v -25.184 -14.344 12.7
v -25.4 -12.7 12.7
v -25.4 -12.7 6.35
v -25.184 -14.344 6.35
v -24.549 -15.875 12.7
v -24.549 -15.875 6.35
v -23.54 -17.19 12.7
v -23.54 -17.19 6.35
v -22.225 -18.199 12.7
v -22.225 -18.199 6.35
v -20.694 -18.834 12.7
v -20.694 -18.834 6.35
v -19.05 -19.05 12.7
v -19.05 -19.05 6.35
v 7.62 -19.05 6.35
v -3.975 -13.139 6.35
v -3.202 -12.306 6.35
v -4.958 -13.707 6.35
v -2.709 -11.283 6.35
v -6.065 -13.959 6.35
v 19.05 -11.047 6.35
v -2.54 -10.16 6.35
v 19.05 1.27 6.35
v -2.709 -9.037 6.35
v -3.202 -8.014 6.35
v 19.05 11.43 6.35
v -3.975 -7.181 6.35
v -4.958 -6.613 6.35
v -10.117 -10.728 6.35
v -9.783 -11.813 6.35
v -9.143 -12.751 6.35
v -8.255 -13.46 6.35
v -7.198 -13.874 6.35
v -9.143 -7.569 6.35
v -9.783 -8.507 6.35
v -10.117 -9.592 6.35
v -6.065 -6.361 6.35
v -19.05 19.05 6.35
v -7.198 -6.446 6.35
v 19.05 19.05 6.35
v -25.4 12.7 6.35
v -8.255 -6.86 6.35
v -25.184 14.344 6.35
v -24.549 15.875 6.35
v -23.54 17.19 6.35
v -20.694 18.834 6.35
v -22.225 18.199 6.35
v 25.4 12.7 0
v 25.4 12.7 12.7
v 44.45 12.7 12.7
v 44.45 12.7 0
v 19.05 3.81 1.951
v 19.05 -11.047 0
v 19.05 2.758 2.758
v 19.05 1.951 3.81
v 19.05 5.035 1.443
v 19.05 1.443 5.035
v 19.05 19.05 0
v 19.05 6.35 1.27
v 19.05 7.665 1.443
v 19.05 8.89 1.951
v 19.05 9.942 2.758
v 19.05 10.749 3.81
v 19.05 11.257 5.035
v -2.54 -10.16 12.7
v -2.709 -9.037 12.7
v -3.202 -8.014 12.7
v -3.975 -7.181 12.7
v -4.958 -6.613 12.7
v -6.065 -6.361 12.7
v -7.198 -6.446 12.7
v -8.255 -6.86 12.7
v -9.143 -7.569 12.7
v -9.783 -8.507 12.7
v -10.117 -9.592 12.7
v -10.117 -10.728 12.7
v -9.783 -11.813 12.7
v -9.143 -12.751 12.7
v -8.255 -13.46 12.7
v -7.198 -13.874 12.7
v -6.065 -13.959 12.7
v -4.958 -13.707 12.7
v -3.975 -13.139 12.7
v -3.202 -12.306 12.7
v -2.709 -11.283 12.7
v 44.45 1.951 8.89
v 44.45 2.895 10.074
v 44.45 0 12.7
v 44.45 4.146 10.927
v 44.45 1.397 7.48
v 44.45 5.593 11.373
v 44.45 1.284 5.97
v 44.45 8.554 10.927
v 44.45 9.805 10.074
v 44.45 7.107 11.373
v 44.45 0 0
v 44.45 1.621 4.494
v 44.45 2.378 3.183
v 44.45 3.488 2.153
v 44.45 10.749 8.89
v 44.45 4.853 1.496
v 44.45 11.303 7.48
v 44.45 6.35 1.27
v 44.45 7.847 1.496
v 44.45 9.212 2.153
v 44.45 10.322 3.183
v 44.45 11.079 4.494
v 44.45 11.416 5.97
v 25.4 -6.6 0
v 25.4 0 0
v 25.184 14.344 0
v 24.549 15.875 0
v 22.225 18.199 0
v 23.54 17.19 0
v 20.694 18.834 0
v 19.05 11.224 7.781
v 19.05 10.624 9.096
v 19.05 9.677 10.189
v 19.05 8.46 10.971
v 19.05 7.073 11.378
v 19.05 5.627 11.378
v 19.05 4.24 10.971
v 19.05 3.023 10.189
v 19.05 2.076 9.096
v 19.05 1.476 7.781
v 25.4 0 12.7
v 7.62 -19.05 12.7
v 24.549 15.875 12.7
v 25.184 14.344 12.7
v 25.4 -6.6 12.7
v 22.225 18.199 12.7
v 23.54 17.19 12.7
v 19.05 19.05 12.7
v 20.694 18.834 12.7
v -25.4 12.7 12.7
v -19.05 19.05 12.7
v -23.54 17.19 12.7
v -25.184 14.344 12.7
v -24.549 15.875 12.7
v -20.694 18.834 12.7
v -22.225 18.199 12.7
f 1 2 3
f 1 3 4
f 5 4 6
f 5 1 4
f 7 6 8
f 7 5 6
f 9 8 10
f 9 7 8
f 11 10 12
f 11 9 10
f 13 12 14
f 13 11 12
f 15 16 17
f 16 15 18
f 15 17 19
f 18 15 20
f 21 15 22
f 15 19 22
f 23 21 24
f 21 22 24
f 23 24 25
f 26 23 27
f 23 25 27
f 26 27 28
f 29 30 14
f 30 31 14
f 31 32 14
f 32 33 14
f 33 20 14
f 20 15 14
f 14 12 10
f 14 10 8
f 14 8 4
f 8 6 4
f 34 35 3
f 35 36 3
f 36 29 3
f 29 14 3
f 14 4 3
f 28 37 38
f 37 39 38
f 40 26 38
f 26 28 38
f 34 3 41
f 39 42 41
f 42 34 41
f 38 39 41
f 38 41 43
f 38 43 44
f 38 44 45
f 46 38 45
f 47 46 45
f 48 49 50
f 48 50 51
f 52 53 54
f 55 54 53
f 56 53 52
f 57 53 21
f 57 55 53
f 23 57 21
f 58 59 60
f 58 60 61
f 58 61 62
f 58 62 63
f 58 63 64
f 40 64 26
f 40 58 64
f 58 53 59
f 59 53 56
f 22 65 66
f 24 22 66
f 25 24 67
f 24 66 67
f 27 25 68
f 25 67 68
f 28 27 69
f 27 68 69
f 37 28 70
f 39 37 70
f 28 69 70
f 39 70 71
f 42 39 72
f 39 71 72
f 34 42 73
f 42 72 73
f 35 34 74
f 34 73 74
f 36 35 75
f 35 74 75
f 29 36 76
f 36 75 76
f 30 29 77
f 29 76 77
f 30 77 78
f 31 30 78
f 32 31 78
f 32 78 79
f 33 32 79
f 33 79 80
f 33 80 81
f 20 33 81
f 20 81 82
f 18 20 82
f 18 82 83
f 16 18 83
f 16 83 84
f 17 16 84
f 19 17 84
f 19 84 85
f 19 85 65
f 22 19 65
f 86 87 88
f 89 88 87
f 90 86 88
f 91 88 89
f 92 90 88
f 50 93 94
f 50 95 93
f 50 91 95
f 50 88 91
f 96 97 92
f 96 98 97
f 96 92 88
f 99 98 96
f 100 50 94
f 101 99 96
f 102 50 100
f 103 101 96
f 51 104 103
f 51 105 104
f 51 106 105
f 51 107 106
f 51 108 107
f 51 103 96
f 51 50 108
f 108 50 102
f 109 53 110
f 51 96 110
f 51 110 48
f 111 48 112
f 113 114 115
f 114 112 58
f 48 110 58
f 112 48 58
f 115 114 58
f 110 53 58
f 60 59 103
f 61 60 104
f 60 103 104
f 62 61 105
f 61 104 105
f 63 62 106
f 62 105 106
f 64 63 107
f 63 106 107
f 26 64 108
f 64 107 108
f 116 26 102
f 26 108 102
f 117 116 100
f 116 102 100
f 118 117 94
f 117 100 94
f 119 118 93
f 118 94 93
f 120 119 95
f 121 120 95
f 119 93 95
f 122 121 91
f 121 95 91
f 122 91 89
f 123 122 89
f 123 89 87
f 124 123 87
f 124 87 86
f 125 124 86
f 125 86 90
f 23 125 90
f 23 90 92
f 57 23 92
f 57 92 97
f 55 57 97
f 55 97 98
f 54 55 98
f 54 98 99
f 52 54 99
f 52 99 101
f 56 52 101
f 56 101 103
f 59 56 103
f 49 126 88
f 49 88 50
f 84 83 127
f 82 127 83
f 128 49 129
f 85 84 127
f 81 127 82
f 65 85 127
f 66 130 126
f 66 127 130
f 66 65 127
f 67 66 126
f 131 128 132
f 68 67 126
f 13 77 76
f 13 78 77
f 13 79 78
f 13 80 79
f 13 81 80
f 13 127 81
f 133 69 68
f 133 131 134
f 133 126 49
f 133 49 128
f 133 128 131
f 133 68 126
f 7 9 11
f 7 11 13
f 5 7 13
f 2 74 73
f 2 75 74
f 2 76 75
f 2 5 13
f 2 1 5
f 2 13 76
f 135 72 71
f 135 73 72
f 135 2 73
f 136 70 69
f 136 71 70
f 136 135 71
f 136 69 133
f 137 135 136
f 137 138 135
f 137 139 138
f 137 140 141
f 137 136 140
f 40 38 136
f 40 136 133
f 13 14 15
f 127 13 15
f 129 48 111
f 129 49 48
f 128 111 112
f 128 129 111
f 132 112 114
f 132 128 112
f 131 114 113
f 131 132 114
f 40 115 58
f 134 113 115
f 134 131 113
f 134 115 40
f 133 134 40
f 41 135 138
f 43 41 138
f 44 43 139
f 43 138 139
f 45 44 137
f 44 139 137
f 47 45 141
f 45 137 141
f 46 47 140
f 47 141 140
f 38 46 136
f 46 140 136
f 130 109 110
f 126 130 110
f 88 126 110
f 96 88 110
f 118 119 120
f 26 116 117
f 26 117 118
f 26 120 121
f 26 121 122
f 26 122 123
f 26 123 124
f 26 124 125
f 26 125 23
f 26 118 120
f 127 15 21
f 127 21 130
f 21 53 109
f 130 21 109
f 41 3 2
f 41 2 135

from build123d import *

# Parameters (mm, degrees)
SKETCH2_W           = 50.8
SKETCH2_H           = 38.1
BOSS_EXTRUDE1_DEPTH = 12.7
FILLET1_R           = 6.35
SKETCH3_R           = 3.81
CUT_EXTRUDE1_DEPTH  = 35.195796525
SKETCH7_W           = 12.7
SKETCH7_H           = 12.7
BOSS_EXTRUDE2_DEPTH = 19.05
SKETCH8_R           = 5.08
CUT_EXTRUDE2_DEPTH  = 25.4
SKETCH9_W           = 6.35
SKETCH9_H           = 38.1
CUT_EXTRUDE3_DEPTH  = 44.45
CUT_EXTRUDE4_REACH  = 52
SKETCH10_W          = 6.35
SKETCH10_H          = 6.35
CHAMFER6_SIZE       = 17.78
CHAMFER6_SIZE_2     = 12.449690029


with BuildPart() as part:
    # Sketch2 → Boss-Extrude1 (new body)
    with BuildSketch(Plane.XY):
        Rectangle(SKETCH2_W, SKETCH2_H)
    extrude(amount=BOSS_EXTRUDE1_DEPTH)

    # Fillet1
    fillet1_edges = [part.edges().sort_by_distance(p)[0] for p in [
        (-25.4, 19.05, 6.35),
        (25.4, 19.05, 6.35),
        (-25.4, -19.05, 6.35),
    ]]
    fillet(fillet1_edges, radius=FILLET1_R)

    # Sketch3 → Cut-Extrude1 (cut, through all)
    with BuildSketch(Plane.XY.offset(12.7)):
        with Locations((-6.35, -10.16)):
            Circle(SKETCH3_R)
    extrude(amount=-CUT_EXTRUDE1_DEPTH, mode=Mode.SUBTRACT)

    # Sketch7 → Boss-Extrude2 (add)
    with BuildSketch(Plane(origin=(25.4, 0, 0), x_dir=(0, 0, -1), z_dir=(1, 0, 0))):
        with Locations((-6.35, 6.35)):
            Rectangle(SKETCH7_W, SKETCH7_H)
    extrude(amount=BOSS_EXTRUDE2_DEPTH)

    # Sketch8 → Cut-Extrude2 (cut)
    with BuildSketch(Plane(origin=(44.45, 0, 0), x_dir=(0, 0, -1), z_dir=(1, 0, 0))):
        with Locations((-6.35, 6.35)):
            Circle(SKETCH8_R)
    extrude(amount=-CUT_EXTRUDE2_DEPTH, mode=Mode.SUBTRACT)

    # Sketch9 → Cut-Extrude3 (cut)
    with BuildSketch(Plane.ZY.offset(25.4)):
        with Locations((3.175, 0)):
            Rectangle(SKETCH9_W, SKETCH9_H)
    extrude(amount=-CUT_EXTRUDE3_DEPTH, mode=Mode.SUBTRACT)

    # Sketch10 → Cut-Extrude4 (cut, up to next)
    with BuildSketch(Plane.ZY.offset(-19.05), mode=Mode.PRIVATE) as cut_extrude4_sk1:
        with Locations((3.175, -15.875)):
            Rectangle(SKETCH10_W, SKETCH10_H)
    cut_extrude4_tool1 = extrude(cut_extrude4_sk1.sketch, amount=-CUT_EXTRUDE4_REACH, mode=Mode.PRIVATE) & part.part
    add(cut_extrude4_tool1.solids().sort_by_distance((19.05, -15.875, 3.175))[0], mode=Mode.SUBTRACT)

    # Chamfer6
    # the kernel refuses this chamfer: 17.78, 12.449690029 mm, written as the material it takes off along each edge
    with BuildSketch(Plane(origin=(25.4, -19.05, -39.567778654), x_dir=(-0.9997533347641299, -0.022209674198457294, 0), z_dir=(0, 0, 1))) as chamfer6_piece_1:
        Polygon((CHAMFER6_SIZE * 0.999753334764, -CHAMFER6_SIZE * 0.0222096741985), (-CHAMFER6_SIZE_2 * 0.0222096741991, -CHAMFER6_SIZE_2 * 0.999753334794), (0, 0), align=None)
    extrude(amount=98.185557309, mode=Mode.SUBTRACT)


solid = part.part
